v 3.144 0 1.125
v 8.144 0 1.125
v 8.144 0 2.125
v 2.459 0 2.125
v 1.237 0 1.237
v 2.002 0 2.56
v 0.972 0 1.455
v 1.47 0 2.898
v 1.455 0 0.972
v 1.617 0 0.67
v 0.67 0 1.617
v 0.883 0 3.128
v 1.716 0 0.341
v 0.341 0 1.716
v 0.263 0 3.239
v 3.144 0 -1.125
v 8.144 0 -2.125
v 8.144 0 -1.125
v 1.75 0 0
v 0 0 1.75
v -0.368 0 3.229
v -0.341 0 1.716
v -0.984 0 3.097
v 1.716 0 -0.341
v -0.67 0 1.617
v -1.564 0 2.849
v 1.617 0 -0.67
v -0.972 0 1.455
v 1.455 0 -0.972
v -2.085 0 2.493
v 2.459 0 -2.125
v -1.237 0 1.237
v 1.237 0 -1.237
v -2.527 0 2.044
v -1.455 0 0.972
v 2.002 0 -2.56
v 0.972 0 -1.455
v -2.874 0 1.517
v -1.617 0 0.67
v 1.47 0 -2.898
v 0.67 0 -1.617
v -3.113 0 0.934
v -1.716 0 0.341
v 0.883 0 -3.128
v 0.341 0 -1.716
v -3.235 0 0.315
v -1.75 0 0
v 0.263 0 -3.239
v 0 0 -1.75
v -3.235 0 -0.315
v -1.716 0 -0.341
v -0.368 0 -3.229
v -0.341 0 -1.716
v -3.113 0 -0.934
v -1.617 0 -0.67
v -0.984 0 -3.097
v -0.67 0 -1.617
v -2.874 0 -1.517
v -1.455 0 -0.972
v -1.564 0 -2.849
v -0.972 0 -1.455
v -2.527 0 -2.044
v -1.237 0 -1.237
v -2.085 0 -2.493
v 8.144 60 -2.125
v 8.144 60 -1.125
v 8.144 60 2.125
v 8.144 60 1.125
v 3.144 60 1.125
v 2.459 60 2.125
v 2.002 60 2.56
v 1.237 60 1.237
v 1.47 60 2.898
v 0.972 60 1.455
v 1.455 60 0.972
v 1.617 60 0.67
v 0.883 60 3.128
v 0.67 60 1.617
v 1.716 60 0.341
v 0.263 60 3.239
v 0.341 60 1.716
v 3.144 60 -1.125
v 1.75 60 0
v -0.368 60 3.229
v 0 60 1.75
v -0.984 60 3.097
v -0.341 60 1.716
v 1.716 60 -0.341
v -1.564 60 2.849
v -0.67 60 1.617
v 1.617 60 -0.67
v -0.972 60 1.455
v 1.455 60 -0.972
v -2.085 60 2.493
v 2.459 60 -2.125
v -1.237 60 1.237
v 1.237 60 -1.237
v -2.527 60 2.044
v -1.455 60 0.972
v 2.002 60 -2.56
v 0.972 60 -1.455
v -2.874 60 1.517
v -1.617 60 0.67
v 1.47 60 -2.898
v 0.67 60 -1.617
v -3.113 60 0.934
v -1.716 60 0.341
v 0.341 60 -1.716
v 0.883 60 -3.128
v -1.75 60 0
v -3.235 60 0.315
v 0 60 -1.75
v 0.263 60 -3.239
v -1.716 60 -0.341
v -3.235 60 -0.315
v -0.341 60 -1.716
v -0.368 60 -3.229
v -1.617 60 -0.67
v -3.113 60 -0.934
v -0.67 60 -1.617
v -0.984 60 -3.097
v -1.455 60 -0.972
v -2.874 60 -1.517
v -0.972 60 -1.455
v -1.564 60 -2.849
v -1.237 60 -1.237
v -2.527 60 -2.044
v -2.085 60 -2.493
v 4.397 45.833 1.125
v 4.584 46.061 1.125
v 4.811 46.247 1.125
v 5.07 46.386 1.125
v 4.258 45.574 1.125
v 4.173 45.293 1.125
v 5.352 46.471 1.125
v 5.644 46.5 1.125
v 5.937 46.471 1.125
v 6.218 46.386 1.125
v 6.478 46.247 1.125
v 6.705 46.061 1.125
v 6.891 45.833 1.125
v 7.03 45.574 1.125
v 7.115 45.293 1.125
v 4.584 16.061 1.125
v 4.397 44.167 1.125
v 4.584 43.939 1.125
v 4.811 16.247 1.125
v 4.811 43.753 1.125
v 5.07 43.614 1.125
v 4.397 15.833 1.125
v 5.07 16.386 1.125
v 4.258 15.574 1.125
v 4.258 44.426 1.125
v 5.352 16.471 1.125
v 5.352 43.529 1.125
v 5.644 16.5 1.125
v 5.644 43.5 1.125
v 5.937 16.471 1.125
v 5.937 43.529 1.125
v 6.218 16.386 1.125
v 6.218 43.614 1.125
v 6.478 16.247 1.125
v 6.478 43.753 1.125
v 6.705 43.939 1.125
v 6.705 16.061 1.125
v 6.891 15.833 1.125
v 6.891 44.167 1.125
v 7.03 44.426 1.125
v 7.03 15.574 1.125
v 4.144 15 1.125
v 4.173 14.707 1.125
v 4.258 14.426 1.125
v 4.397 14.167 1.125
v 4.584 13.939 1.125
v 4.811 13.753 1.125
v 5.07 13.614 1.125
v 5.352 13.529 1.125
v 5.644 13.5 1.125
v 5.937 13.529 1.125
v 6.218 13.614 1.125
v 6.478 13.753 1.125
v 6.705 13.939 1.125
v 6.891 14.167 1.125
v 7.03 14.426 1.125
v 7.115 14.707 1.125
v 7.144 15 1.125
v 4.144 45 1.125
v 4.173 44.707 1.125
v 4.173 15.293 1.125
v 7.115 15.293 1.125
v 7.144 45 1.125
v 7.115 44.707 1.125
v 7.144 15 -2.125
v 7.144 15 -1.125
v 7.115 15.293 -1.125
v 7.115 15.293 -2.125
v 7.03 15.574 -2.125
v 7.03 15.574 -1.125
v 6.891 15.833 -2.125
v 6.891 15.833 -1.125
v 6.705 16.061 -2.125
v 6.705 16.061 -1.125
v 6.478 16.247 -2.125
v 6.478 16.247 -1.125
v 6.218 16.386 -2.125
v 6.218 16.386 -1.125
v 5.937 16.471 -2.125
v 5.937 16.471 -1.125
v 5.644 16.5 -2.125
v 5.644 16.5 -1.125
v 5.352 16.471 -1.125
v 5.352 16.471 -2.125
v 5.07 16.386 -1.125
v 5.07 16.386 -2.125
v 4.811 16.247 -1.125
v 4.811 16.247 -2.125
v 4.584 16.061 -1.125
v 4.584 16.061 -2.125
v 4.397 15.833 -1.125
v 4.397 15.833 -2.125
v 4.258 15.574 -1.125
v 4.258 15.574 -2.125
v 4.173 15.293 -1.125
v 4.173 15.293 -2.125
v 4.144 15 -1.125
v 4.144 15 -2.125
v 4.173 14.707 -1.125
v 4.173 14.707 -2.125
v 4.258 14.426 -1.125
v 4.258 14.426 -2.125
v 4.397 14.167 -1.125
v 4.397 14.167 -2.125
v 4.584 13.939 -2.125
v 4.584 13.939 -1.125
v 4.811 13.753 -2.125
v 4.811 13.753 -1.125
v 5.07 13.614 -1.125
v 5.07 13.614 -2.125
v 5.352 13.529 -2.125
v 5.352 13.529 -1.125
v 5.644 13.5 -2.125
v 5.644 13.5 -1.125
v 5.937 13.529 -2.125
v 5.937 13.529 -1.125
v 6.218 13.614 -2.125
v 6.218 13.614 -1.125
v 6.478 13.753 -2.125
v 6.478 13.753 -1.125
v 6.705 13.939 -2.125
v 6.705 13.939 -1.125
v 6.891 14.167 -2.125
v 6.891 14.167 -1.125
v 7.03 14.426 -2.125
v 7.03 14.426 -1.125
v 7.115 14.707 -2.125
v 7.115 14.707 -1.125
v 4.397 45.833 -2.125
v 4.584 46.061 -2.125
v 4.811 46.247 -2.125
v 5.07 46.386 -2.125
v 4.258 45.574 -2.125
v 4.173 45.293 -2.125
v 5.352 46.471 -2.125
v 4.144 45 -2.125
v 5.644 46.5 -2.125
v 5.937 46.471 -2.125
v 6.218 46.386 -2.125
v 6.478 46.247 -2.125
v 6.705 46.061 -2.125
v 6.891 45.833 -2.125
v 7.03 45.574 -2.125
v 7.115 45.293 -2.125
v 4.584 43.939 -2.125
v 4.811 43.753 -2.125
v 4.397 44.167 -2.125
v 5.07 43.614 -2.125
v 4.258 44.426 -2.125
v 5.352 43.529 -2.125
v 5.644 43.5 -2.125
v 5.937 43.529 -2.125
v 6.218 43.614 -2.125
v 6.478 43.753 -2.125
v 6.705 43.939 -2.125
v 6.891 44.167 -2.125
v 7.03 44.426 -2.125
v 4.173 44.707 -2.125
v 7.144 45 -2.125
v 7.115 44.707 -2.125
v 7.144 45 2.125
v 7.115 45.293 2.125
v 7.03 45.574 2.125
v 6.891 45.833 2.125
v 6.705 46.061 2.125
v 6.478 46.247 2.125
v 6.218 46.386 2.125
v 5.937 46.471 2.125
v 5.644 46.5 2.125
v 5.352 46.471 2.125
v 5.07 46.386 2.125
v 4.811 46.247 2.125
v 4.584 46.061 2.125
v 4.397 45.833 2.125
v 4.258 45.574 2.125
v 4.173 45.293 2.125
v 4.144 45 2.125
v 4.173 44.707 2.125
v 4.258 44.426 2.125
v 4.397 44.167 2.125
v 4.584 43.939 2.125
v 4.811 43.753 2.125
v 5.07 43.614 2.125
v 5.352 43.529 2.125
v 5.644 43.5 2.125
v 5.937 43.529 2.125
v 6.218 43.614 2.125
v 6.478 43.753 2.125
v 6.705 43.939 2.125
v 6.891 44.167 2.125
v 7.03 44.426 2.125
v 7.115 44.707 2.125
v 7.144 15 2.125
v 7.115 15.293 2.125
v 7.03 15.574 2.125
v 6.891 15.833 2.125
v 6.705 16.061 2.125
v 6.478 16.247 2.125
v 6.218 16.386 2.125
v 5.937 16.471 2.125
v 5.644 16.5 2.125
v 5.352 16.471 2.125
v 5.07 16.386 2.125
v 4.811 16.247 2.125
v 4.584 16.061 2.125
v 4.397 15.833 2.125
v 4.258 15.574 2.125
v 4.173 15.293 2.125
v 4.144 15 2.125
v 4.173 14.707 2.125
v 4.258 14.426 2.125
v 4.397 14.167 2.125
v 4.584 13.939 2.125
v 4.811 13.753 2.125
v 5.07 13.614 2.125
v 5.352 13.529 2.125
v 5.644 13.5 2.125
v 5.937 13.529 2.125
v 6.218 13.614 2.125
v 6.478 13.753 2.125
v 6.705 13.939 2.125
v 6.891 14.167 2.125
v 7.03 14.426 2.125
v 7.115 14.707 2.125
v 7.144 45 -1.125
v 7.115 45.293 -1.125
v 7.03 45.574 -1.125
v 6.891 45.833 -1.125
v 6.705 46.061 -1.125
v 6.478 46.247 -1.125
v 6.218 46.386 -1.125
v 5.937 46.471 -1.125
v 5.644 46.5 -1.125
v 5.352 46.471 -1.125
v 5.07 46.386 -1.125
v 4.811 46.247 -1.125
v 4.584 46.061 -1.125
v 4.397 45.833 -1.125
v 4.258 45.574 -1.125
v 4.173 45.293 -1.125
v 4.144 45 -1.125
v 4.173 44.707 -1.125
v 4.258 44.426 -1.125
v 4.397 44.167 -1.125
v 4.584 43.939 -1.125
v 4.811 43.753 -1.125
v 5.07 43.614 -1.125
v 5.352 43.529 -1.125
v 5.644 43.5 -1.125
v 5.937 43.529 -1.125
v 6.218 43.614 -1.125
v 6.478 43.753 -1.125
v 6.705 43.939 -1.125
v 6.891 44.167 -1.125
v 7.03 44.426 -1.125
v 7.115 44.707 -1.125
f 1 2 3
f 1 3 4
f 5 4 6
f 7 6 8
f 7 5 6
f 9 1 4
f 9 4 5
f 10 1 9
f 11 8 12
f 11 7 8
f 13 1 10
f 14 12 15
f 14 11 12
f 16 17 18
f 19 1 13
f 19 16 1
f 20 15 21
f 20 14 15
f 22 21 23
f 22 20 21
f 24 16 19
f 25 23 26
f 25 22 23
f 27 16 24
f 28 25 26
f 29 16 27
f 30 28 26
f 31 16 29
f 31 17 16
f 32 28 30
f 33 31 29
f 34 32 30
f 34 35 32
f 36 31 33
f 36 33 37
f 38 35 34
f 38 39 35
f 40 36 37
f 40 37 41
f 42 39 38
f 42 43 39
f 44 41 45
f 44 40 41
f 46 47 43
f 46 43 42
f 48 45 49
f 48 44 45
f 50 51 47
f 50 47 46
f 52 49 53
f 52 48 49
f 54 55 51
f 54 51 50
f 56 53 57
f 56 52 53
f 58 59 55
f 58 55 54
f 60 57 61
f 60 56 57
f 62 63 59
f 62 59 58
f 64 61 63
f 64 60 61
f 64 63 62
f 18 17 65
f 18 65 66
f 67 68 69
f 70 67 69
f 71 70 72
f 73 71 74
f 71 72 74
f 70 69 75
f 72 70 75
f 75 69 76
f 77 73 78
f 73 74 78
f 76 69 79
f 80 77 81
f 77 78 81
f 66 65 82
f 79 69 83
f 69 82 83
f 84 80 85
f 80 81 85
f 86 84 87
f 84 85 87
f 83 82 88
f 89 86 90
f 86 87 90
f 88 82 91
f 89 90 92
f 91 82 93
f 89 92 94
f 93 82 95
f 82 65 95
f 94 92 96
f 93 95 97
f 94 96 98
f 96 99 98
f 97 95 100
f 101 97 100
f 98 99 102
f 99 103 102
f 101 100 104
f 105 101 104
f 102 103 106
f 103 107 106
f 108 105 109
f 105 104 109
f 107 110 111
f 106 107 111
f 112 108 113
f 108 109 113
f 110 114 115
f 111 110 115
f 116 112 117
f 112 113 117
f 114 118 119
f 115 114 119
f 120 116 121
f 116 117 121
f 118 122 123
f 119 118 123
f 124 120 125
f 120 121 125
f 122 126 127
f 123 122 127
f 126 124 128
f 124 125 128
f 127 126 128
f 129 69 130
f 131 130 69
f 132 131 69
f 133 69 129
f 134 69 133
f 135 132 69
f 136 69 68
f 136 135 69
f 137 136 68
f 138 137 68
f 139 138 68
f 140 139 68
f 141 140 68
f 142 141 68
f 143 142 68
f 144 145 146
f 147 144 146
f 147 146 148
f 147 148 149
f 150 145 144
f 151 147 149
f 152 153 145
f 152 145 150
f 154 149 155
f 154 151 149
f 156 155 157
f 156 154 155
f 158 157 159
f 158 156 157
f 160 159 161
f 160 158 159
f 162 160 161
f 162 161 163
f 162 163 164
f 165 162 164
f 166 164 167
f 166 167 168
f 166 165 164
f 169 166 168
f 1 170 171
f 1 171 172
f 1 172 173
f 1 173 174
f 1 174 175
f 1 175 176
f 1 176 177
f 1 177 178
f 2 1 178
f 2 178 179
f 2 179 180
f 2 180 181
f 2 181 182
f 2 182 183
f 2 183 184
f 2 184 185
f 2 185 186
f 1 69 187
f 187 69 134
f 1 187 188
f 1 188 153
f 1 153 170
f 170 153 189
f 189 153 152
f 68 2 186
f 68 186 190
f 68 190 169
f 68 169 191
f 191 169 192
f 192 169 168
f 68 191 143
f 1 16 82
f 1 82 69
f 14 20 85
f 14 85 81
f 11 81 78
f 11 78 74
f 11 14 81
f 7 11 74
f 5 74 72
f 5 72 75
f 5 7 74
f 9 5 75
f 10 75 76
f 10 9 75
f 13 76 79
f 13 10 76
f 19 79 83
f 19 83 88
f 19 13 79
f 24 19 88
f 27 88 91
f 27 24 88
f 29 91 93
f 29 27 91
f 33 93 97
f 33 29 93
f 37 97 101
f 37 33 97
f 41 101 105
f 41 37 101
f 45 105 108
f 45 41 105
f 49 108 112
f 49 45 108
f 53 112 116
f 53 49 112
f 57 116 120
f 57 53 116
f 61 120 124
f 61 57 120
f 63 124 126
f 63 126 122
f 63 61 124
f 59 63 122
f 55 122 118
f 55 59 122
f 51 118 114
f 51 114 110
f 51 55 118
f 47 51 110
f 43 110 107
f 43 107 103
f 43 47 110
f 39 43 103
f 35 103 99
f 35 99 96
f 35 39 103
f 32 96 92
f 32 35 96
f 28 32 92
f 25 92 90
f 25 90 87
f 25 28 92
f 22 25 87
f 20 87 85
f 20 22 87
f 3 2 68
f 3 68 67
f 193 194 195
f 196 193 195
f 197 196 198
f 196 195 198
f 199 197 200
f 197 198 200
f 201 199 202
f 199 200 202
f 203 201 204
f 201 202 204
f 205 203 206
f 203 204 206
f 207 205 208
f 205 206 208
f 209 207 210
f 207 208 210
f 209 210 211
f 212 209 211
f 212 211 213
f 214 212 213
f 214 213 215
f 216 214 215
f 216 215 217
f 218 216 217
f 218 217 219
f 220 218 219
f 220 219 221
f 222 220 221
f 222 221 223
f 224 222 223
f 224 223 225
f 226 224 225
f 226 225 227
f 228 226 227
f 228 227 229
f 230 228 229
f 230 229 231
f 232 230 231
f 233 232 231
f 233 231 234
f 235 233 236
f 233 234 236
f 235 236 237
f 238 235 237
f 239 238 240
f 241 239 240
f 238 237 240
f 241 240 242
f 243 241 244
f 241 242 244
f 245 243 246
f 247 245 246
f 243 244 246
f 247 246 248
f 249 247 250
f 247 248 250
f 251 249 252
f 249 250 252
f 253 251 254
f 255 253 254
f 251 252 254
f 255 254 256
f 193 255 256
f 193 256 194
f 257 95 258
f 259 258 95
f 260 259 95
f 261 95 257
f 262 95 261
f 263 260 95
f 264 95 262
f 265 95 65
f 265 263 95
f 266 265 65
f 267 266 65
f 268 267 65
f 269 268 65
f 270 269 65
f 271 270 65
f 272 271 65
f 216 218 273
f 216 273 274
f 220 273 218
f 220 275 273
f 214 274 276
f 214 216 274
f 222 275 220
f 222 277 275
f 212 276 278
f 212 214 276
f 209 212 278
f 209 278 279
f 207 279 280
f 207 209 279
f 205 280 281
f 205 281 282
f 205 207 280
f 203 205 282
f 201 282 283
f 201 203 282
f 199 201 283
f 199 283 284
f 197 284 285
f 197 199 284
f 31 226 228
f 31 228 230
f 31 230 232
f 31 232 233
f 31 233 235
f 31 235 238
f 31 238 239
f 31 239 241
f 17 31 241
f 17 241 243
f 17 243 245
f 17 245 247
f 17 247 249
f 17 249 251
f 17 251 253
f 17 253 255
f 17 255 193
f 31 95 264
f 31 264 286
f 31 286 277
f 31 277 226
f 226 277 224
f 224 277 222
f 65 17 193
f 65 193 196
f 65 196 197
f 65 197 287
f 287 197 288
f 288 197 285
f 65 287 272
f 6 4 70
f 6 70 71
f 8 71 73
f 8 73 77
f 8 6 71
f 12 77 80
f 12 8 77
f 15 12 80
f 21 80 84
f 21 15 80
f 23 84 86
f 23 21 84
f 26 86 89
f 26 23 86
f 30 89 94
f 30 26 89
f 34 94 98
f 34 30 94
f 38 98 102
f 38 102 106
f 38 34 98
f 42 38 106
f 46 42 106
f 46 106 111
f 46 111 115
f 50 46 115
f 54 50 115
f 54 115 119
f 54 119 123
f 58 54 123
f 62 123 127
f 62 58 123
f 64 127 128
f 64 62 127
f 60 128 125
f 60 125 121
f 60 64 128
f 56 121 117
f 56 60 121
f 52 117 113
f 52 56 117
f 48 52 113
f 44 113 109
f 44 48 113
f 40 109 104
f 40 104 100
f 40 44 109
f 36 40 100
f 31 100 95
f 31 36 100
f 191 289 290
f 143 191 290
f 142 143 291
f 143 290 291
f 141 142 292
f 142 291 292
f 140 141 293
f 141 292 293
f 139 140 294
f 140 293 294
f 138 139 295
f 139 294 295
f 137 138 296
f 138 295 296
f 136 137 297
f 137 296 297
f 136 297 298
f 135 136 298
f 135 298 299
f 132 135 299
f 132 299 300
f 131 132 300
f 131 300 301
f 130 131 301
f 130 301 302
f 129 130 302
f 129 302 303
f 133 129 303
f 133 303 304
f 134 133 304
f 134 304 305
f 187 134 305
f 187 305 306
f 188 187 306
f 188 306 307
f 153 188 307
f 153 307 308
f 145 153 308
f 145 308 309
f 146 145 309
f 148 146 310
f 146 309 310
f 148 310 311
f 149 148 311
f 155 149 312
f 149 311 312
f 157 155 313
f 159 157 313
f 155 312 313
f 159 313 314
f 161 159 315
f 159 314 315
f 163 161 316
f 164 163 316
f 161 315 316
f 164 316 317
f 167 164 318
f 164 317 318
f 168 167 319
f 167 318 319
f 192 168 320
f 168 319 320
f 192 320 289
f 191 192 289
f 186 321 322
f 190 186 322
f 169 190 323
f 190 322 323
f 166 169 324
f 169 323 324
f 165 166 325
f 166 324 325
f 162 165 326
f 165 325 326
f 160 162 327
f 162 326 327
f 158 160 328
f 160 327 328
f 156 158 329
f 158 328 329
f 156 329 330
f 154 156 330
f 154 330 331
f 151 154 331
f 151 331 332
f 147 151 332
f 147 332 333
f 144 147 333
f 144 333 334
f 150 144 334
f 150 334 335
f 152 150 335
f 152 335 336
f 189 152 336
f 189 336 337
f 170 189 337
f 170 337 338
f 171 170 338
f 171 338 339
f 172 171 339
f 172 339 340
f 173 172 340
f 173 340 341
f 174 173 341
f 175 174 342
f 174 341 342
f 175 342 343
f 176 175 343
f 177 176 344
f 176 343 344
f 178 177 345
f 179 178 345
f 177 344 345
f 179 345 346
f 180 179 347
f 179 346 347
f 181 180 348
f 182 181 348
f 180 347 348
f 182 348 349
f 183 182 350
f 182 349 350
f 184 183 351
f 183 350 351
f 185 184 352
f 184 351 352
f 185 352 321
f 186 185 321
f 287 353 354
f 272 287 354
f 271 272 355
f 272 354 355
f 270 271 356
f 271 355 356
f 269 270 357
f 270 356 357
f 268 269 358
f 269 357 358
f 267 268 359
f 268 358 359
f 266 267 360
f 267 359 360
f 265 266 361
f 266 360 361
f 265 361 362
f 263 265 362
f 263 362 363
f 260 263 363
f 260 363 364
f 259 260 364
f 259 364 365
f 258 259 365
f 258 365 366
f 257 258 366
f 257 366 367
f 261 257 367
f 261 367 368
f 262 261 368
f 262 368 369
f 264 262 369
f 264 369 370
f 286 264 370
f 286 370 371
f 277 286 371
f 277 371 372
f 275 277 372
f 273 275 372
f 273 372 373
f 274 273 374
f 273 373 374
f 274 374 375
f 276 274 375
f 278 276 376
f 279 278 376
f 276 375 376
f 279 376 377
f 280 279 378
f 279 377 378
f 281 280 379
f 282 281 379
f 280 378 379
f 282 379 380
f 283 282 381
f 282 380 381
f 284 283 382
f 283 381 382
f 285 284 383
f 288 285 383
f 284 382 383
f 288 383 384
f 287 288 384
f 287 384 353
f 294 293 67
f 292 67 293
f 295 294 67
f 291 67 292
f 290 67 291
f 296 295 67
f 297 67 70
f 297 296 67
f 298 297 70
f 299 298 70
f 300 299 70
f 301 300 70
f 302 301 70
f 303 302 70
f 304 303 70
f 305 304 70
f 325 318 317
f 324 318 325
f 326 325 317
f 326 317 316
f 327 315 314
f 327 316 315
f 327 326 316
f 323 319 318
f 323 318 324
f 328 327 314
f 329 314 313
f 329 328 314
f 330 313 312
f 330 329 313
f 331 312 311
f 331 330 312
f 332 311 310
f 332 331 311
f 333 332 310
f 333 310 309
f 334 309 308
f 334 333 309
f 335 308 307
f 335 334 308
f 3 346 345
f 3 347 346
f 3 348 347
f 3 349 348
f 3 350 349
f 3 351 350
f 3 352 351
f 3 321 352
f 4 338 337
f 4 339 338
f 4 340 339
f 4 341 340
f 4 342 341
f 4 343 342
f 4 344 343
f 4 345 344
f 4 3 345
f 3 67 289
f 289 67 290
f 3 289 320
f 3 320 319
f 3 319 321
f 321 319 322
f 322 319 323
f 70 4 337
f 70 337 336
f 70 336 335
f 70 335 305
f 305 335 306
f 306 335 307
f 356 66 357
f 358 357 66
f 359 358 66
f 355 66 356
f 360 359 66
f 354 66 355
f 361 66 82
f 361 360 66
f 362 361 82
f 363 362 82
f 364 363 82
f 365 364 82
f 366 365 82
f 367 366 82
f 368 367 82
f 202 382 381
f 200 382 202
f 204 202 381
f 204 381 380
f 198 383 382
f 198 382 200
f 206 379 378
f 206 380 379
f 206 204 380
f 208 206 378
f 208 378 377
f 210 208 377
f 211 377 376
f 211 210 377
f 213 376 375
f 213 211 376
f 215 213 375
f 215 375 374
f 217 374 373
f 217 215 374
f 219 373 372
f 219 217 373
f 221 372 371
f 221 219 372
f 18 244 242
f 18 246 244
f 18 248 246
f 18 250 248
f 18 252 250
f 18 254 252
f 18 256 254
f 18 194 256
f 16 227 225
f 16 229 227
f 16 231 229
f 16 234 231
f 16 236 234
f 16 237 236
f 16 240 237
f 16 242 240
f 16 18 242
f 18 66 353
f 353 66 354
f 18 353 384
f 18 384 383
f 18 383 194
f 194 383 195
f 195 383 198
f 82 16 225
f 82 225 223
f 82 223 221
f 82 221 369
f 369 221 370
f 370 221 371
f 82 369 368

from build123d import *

# Parameters (mm, degrees)
SKETCH1_R           = 1.75
BOSS_EXTRUDE1_DEPTH = 60
SKETCH2_R           = 1.5
CUT_EXTRUDE1_DEPTH  = 60


with BuildPart() as part:
    # Sketch1 → Boss-Extrude1 (new body)
    with BuildSketch(Plane(origin=(0, 0, 0), x_dir=(1, 0, 0), z_dir=(0, 1, 0))):
        with BuildLine():
            Line((8.14420001, -1.125), (8.14420001, -2.125))
            Line((8.14420001, -2.125), (2.459039447, -2.125))
            ThreePointArc((2.459039447, -2.125), (-3.25, 0), (2.459039447, 2.125))
            Line((2.459039447, 2.125), (8.14420001, 2.125))
            Line((8.14420001, 2.125), (8.14420001, 1.125))
            Line((8.14420001, 1.125), (3.14420001, 1.125))
            Line((3.14420001, 1.125), (3.14420001, -1.125))
            Line((3.14420001, -1.125), (8.14420001, -1.125))
        make_face()
        with Locations(Location((0, 0, 0), (0, 0, 270))):
            Circle(SKETCH1_R, mode=Mode.SUBTRACT)
    extrude(amount=BOSS_EXTRUDE1_DEPTH)

    # Sketch2 → Cut-Extrude1 (cut)
    with BuildSketch(Plane.XY.offset(2.125)):
        with Locations((5.64420001, 45)):
            Circle(SKETCH2_R)
        with Locations((5.64420001, 15)):
            Circle(SKETCH2_R)
    extrude(amount=-CUT_EXTRUDE1_DEPTH, mode=Mode.SUBTRACT)


solid = part.part
